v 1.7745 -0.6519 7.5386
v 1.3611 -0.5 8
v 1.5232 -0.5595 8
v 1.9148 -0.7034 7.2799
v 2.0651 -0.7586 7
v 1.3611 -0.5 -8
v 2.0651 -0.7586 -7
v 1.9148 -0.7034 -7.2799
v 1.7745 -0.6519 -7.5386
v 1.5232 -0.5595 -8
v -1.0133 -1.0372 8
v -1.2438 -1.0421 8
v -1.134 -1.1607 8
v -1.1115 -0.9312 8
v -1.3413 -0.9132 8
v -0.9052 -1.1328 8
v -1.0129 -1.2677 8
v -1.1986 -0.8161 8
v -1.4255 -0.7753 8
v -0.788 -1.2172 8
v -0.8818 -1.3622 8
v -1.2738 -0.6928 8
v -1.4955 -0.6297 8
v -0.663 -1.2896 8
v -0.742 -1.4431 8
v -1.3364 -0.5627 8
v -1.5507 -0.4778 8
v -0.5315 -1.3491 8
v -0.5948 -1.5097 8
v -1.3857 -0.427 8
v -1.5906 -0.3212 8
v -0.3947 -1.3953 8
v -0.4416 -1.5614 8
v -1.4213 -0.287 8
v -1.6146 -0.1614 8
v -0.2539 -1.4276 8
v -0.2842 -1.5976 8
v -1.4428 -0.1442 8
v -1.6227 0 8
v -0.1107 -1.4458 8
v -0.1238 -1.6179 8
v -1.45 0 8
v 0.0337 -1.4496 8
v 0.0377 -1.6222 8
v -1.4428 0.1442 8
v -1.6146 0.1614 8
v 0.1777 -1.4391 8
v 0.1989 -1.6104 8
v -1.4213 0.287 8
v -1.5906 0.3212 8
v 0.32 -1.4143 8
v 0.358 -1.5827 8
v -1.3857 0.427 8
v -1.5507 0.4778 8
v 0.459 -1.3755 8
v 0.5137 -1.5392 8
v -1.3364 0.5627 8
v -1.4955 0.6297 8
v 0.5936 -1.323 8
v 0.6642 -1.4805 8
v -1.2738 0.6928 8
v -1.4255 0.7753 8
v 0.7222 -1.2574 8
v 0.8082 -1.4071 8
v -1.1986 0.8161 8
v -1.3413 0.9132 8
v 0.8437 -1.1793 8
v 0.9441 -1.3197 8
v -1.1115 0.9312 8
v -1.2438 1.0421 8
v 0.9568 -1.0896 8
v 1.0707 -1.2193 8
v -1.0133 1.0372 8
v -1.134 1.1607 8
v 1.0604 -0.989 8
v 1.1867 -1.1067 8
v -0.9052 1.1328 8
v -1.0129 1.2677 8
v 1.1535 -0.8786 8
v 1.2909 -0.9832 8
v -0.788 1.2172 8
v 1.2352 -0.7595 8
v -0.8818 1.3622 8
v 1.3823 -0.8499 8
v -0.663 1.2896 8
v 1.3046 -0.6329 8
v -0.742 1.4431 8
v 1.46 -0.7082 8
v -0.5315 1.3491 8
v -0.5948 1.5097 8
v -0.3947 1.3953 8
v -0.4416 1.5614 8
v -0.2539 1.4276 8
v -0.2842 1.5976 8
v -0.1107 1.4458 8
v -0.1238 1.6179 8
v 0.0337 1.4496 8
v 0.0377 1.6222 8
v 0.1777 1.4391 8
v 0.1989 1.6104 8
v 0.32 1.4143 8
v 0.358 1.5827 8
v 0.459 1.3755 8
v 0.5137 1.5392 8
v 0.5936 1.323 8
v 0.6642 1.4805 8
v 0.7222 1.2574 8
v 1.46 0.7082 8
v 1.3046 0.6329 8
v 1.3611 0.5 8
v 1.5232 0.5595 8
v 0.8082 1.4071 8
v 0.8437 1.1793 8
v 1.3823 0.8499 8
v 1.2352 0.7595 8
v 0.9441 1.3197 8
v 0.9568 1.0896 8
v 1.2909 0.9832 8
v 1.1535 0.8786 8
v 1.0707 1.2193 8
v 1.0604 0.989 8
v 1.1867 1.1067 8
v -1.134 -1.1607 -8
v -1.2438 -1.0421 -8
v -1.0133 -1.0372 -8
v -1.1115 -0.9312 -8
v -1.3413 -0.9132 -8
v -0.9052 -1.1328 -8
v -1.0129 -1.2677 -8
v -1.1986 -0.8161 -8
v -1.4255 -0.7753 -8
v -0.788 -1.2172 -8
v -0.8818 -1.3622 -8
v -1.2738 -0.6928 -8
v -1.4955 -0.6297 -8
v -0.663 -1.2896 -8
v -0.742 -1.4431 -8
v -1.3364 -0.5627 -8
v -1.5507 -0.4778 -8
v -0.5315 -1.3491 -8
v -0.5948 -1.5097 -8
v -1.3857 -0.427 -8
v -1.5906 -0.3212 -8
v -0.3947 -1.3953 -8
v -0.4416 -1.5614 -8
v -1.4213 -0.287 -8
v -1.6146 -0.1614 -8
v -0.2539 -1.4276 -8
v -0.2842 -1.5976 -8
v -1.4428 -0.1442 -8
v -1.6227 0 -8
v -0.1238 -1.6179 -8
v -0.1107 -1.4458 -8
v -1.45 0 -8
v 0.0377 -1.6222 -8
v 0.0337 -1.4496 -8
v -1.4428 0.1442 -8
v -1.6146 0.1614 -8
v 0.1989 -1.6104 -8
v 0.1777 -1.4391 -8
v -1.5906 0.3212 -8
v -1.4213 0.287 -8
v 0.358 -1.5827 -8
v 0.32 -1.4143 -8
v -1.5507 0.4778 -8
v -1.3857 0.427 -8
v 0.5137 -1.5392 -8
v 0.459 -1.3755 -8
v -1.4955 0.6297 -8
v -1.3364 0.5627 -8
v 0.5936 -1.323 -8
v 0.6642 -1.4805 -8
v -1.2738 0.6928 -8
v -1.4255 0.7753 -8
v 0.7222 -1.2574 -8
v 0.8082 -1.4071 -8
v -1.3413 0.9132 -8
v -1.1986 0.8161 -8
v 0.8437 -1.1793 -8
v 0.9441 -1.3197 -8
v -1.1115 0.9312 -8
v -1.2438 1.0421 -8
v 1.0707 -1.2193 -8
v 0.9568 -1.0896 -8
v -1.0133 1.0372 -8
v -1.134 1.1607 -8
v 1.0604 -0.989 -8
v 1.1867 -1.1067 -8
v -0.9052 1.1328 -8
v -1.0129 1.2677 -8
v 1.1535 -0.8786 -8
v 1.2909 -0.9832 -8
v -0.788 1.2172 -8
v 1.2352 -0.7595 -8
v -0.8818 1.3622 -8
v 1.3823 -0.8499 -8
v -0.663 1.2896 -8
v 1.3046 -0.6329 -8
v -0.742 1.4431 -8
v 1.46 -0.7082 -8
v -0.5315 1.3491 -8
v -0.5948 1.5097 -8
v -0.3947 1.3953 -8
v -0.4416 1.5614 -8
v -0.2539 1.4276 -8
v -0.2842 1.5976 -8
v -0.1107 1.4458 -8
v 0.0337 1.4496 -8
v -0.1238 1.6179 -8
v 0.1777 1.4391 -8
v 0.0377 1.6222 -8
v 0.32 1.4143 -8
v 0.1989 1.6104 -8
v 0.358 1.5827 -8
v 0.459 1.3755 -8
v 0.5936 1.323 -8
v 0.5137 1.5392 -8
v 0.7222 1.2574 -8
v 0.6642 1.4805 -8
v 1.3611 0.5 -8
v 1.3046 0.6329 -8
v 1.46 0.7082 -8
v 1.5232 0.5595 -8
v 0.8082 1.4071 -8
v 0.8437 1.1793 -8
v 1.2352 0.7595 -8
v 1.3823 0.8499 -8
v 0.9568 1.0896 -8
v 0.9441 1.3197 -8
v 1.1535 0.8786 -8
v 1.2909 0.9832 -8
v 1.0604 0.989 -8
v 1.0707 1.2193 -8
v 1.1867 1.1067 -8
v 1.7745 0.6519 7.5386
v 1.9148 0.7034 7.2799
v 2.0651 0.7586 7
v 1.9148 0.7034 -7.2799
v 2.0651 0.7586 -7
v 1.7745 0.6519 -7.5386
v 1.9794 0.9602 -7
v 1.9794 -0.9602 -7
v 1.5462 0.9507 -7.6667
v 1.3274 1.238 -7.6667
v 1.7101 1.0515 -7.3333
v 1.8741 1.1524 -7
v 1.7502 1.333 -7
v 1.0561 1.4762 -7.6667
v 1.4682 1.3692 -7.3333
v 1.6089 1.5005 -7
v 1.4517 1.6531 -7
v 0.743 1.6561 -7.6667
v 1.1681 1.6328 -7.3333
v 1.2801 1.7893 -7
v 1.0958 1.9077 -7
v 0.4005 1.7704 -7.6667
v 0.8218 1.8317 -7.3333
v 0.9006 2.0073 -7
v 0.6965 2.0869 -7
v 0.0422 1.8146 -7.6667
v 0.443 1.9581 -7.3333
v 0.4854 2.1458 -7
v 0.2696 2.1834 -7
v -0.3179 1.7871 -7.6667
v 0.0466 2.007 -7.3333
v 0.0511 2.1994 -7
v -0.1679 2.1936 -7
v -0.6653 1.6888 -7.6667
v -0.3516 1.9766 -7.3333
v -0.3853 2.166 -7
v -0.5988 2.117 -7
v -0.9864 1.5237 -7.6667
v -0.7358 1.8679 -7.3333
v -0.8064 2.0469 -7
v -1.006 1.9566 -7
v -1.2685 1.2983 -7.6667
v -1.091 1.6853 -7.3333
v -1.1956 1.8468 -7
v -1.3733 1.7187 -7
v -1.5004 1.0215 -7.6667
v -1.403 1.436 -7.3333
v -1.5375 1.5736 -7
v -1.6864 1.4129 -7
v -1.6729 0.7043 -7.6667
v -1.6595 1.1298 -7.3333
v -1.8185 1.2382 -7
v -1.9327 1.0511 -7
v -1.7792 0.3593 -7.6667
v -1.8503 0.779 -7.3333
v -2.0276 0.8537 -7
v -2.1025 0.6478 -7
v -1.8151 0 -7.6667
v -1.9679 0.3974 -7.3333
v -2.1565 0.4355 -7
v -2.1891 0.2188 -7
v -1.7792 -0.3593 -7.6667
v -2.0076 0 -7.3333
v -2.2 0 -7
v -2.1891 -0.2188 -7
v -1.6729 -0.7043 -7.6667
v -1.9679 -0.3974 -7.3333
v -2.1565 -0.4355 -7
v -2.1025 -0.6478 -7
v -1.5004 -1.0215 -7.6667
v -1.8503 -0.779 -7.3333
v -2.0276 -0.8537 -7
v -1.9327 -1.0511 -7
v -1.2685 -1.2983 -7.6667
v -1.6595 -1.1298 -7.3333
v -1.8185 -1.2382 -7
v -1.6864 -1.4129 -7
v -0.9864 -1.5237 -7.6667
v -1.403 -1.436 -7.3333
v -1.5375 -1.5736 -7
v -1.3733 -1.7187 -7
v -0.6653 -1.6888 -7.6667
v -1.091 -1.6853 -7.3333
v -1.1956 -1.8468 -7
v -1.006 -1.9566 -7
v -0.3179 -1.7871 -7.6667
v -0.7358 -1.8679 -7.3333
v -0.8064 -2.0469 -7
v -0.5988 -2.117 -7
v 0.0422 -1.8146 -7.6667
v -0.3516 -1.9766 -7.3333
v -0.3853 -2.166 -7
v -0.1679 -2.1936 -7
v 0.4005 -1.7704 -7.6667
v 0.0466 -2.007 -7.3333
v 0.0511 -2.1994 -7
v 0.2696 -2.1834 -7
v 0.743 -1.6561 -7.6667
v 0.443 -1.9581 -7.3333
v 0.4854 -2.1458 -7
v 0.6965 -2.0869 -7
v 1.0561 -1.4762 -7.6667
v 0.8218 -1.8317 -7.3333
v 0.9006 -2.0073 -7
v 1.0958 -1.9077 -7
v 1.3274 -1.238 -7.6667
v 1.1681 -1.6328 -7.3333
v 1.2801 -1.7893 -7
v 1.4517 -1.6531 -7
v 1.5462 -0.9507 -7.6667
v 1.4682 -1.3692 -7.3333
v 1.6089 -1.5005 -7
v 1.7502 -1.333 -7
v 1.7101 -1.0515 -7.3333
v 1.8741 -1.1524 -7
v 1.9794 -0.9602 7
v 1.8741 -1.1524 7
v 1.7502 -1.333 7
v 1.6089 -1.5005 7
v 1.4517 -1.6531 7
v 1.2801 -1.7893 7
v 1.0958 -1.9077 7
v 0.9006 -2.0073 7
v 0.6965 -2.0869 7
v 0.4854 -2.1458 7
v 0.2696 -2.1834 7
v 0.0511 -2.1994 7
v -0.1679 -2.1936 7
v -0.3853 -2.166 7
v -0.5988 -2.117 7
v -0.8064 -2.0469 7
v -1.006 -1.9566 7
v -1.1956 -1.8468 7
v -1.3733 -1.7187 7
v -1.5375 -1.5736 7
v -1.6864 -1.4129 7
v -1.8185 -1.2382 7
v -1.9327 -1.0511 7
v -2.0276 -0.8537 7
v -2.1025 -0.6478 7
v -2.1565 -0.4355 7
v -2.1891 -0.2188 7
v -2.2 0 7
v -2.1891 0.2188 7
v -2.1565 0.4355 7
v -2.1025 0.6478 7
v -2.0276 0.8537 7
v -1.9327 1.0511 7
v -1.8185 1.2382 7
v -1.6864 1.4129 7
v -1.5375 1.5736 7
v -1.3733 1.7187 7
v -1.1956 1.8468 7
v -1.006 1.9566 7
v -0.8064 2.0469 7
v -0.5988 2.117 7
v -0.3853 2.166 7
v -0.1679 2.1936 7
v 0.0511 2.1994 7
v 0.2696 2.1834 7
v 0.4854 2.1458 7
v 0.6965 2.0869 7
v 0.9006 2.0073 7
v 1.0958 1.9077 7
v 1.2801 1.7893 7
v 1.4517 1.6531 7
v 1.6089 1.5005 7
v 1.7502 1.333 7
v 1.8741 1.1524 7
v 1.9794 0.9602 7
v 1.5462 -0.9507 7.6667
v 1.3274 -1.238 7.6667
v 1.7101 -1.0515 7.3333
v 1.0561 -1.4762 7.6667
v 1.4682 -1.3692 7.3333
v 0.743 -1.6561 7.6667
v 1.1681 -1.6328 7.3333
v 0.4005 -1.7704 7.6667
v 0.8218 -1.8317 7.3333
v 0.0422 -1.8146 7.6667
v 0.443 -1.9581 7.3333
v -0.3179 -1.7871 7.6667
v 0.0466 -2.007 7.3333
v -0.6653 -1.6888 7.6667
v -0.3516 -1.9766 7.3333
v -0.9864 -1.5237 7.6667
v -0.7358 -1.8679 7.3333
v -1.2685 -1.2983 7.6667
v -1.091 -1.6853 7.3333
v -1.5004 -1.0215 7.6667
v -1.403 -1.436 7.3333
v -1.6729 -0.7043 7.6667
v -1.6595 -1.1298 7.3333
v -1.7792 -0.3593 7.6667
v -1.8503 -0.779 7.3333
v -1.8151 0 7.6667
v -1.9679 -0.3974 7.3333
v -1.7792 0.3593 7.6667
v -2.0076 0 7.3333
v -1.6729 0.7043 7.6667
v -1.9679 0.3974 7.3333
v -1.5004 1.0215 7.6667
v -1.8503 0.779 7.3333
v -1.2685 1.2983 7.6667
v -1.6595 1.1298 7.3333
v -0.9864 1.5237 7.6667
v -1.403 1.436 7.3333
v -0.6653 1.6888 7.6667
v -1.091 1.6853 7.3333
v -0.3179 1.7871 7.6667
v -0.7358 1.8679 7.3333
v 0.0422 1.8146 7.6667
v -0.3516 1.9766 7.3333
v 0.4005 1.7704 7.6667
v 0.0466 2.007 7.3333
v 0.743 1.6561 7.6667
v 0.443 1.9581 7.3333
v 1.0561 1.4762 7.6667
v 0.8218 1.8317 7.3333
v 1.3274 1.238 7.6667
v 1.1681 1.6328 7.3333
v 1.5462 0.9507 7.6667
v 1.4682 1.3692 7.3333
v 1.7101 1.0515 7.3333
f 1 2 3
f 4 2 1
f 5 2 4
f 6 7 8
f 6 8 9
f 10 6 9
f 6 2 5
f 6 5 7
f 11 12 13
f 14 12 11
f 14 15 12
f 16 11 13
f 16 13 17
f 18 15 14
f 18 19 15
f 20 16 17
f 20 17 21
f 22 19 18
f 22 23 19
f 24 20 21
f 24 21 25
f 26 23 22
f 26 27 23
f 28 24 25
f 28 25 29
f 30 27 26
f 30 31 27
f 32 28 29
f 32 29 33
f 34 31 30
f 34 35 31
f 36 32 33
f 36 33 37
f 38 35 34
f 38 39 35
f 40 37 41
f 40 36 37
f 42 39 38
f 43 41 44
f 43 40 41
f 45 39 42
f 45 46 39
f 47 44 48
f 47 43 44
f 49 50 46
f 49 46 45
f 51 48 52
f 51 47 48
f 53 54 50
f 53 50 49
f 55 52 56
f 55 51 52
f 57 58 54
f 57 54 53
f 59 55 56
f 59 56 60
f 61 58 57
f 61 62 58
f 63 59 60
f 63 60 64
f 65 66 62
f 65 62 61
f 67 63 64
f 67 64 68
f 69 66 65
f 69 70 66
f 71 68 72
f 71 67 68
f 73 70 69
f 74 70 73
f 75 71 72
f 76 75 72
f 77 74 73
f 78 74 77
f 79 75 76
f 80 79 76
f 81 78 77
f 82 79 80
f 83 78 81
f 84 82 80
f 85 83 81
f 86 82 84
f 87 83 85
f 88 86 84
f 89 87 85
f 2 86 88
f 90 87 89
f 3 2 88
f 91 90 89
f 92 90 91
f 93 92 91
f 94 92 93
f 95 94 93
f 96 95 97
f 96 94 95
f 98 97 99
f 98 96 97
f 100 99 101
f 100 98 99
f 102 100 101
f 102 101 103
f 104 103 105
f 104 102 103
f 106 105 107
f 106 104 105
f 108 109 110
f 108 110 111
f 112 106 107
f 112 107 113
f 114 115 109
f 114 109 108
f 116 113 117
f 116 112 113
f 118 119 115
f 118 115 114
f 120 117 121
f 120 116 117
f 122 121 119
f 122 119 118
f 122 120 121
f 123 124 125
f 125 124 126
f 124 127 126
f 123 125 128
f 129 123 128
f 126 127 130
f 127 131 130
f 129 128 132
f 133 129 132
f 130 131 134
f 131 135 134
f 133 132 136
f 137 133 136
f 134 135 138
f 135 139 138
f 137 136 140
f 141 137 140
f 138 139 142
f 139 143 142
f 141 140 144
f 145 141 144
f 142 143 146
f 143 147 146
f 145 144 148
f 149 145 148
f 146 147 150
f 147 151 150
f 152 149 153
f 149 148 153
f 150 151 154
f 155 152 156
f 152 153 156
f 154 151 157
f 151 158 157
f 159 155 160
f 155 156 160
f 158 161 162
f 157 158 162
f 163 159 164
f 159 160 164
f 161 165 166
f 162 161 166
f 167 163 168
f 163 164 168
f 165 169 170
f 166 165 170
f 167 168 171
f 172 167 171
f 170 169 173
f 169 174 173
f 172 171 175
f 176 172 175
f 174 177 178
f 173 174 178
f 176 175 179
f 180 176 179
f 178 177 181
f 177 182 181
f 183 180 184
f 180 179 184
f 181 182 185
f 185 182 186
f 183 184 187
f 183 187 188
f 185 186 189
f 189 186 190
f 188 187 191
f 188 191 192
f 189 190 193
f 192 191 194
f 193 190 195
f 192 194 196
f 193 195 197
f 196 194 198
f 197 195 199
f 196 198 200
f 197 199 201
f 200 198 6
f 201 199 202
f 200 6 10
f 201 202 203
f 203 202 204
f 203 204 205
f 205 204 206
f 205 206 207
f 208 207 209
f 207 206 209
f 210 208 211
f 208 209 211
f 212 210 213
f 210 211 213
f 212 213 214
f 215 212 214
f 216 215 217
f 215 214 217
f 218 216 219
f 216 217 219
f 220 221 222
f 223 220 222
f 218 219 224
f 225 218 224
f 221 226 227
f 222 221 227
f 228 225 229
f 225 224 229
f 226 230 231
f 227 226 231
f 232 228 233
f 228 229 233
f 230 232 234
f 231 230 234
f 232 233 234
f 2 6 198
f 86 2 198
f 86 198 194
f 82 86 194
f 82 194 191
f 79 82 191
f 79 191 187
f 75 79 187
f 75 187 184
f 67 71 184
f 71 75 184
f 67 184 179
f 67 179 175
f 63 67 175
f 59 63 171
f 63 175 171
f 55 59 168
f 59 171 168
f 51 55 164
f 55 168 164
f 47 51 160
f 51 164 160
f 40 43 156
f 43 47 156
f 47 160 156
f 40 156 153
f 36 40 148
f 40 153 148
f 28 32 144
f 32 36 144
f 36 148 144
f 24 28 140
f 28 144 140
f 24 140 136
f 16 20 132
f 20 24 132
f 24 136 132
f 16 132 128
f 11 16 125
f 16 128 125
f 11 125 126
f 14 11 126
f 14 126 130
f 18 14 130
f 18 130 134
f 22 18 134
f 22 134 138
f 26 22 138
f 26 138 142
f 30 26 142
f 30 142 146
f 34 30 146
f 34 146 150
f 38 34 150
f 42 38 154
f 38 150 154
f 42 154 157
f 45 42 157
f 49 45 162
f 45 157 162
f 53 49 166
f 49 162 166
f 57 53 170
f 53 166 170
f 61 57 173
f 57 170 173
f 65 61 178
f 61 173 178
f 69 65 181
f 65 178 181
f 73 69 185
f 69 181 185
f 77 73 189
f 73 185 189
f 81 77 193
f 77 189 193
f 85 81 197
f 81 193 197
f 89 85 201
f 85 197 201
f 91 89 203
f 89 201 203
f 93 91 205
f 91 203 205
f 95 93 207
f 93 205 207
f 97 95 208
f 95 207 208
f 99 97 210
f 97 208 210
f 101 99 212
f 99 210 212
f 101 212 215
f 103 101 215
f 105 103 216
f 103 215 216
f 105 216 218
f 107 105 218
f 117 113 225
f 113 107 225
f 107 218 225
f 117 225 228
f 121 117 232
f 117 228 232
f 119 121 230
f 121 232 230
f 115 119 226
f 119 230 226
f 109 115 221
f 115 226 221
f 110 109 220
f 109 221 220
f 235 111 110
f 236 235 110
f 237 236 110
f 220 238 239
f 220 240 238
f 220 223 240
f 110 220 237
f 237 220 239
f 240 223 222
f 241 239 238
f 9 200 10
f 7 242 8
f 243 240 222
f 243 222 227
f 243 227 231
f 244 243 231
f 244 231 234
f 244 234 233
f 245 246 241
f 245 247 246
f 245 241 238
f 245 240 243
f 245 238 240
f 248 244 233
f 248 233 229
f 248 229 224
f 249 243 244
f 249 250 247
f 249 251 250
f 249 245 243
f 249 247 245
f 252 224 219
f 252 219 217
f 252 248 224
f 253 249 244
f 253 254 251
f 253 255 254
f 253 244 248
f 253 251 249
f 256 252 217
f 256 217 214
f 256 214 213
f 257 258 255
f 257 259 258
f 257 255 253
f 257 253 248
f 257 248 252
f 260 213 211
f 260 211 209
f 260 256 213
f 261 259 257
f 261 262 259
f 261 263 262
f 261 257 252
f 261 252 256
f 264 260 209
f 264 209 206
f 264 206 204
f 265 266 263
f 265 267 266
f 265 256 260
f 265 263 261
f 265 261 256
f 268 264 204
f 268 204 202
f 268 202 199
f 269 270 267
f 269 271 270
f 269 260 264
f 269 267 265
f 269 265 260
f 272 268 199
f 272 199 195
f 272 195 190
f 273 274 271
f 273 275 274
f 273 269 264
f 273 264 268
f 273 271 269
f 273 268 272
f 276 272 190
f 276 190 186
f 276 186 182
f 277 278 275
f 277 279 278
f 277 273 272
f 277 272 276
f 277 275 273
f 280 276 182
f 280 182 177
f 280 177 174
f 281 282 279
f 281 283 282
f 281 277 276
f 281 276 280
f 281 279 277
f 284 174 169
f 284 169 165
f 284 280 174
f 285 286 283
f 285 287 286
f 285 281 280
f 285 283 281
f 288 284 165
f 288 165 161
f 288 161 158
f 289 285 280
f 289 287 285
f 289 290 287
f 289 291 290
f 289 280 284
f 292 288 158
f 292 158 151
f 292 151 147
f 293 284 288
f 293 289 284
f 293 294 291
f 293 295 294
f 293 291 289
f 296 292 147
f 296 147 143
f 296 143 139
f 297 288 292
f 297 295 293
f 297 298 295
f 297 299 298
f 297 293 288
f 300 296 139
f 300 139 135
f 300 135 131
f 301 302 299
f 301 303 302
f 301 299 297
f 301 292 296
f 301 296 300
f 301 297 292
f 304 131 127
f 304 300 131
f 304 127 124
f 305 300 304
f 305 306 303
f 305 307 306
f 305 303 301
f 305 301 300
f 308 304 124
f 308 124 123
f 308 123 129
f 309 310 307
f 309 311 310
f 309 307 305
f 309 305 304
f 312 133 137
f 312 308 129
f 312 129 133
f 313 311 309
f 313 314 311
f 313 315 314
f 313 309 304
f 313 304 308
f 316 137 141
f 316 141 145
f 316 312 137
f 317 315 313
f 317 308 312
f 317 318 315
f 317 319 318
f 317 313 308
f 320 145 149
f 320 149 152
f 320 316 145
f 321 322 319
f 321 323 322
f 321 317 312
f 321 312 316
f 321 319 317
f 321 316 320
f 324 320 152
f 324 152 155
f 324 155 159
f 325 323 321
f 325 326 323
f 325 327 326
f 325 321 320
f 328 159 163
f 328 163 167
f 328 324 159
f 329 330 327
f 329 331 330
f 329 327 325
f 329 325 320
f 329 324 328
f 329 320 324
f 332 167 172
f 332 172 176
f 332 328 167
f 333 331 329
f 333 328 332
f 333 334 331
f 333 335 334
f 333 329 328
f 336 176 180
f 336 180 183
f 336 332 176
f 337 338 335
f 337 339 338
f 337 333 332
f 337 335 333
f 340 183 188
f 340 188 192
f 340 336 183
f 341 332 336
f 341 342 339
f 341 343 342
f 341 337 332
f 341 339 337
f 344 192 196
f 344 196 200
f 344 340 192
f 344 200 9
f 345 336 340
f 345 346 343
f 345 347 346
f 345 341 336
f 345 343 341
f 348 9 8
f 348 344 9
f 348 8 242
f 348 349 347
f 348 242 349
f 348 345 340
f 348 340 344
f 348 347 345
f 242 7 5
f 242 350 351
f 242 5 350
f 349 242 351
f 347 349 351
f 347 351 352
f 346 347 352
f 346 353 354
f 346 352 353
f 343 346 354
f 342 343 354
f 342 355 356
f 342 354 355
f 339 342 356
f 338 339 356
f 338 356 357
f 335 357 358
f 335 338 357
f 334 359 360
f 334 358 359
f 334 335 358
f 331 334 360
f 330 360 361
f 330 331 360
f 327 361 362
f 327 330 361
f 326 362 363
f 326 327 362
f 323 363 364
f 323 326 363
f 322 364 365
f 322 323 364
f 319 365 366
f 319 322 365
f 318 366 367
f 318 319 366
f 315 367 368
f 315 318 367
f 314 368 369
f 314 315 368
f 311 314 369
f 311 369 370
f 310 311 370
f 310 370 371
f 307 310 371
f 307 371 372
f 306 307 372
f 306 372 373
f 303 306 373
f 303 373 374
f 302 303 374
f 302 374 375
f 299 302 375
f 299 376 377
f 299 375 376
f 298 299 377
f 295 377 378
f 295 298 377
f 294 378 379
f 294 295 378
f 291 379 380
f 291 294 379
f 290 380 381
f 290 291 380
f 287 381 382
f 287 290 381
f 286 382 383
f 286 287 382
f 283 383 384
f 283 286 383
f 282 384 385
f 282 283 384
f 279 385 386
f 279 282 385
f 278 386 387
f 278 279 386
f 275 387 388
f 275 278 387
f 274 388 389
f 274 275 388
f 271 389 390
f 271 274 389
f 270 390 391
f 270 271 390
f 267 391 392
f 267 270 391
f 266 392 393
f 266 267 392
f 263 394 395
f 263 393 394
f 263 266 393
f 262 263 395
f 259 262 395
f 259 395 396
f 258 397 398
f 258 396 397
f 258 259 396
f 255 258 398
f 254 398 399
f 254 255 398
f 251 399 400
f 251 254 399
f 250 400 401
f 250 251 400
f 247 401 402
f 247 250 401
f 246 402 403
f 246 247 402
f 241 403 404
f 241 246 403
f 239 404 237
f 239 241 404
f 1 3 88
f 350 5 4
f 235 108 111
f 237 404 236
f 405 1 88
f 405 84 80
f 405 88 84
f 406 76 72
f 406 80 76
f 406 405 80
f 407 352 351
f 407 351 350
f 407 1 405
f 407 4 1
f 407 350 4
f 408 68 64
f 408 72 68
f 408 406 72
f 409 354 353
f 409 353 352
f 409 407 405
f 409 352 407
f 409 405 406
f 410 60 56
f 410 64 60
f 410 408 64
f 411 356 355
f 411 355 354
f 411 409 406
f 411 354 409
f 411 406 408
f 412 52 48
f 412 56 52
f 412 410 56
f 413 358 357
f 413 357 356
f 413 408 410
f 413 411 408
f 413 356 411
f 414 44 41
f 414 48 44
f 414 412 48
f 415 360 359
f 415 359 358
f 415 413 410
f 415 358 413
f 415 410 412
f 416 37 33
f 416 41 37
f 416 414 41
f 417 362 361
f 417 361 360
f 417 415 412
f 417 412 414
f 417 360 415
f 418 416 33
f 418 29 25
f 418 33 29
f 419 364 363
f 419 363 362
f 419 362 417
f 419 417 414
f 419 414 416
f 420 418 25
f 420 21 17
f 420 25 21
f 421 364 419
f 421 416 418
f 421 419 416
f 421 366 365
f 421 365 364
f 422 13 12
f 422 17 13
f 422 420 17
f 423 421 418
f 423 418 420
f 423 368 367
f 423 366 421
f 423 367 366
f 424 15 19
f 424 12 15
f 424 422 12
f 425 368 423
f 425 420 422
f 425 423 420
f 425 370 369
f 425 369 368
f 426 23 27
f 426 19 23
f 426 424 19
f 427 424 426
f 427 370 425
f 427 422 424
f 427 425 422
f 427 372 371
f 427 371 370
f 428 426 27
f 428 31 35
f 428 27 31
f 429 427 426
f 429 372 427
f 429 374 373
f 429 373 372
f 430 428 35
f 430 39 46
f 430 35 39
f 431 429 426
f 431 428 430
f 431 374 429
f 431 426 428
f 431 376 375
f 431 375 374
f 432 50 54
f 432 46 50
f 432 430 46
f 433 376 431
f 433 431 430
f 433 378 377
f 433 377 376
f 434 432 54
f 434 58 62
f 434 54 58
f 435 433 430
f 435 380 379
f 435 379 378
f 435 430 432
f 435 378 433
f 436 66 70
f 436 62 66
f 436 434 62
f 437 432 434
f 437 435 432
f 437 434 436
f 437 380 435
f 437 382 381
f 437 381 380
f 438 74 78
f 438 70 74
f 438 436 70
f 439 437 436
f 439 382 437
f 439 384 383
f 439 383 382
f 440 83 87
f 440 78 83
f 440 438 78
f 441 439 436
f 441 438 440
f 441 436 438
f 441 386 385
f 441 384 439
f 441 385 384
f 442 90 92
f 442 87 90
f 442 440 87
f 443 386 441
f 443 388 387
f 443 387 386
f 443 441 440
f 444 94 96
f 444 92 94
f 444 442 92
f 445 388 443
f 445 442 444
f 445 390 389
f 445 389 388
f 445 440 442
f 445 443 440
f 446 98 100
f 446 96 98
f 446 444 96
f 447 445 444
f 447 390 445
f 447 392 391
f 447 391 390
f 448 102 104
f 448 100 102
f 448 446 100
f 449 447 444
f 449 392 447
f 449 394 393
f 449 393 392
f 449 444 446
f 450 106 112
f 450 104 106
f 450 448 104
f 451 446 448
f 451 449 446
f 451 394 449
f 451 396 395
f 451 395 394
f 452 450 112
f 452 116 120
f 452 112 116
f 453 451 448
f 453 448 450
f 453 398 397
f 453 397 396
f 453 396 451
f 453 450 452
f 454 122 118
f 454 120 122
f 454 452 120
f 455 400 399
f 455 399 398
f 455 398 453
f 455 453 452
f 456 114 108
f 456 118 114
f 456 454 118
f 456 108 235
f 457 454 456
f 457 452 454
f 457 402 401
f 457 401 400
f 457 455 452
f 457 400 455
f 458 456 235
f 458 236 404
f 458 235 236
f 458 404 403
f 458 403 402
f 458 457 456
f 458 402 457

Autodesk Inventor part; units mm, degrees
ref_plane "YZ Plane" through (0, 0, 0) normal (1, 0, 0) x (0, 1, 0)
ref_plane "XZ Plane" through (0, 0, 0) normal (0, 1, 0) x (-1, 0, 0)
ref_plane "XY Plane" through (0, 0, 0) normal (0, 0, 1) x (1, 0, 0)
sketch "Sketch1" plane through (0, 0, 0) normal (0, 0, 1) x (1, 0, 0)
  arc A0 (2.0651, 0.7586) -> (2.0651, -0.7586) centre (0, 0) ccw
  arc A1 (1.3611, 0.5) -> (1.3611, -0.5) centre (0, 0) ccw
  line L0 (2.0651, 0.7586) -> (1.3611, 0.5)
  line L1 (0, 0) -> (1.3611, -0.5) construction
  line L2 (1.3611, 0.5) -> (0, 0) construction
  line L3 (1.3611, -0.5) -> (2.0651, -0.7586)
  line L4 (-3.053, 0) -> (2.9181, 0) construction
  dimension "d0" = 4.4
  dimension "d1" = 2.9
  dimension "d2" = 1
extrude "Extrusion1" add sketch "Sketch1" along normal mid plane 16
chamfer "Chamfer1" distance 1 angle 30 2 edges at (-2.2, 0, 8) (-2.2, 0, -8) measured on face at (-1.7005, -1.3958, -2.6667)
properties material "ABS Plastic"
